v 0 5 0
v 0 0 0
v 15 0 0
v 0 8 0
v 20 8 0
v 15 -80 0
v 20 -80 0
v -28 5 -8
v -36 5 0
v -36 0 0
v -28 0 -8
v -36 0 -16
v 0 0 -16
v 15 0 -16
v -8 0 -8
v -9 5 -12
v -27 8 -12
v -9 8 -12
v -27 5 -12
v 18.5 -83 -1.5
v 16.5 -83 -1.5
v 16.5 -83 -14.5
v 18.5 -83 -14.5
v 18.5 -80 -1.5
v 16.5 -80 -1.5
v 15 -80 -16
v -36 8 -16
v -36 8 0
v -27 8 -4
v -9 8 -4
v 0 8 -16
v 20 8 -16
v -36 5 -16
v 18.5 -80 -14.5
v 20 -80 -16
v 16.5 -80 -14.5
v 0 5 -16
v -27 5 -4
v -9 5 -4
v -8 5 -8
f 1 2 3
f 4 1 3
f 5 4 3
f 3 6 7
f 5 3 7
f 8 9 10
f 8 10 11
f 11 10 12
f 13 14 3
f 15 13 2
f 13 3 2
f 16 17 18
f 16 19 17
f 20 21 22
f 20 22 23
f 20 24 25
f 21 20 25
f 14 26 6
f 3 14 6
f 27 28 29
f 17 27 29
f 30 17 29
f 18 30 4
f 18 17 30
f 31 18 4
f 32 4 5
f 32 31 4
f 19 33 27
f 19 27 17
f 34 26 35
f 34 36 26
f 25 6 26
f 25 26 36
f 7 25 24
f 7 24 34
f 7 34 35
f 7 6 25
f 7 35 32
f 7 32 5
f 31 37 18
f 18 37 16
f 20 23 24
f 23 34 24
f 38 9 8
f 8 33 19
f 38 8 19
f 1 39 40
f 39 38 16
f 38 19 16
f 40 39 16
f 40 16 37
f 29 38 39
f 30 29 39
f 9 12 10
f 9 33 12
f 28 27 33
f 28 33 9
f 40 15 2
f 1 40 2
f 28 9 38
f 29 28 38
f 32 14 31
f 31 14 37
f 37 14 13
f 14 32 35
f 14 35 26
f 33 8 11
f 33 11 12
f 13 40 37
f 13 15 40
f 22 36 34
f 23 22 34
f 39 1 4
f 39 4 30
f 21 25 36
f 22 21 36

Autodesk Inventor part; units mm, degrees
ref_plane "YZ Plane" through (0, 0, 0) normal (1, 0, 0) x (0, 1, 0)
ref_plane "XZ Plane" through (0, 0, 0) normal (0, 1, 0) x (-1, 0, 0)
ref_plane "XY Plane" through (0, 0, 0) normal (0, 0, 1) x (1, 0, 0)
sketch "Sketch1" plane through (0, 0, 0) normal (0, 1, 0) x (-1, 0, 0)
  line L0 (0, 0) -> (0, -16)
  line L1 (8, -8) -> (0, 0)
  line L2 (8, -8) -> (0, -16)
  line L3 (0, 0) -> (-20, 0)
  line L4 (-20, 0) -> (-20, -16)
  line L5 (-20, -16) -> (0, -16)
  dimension "d0" = 16
  dimension "d2" = 20
extrude "Extrusion1" add sketch "Sketch1" along normal blind 5
sketch "Sketch2" plane through (0, 0, 0) normal (0, -1, 0) x (1, 0, 0)
  line L0 (20, -16) -> (0, -16) projected
  line L1 (20, -16) -> (15, -16)
  line L2 (15, -16) -> (15, 0)
  line L3 (0, 0) -> (20, 0) projected
  line L4 (20, 0) -> (20, -16) projected
  line L5 (20, 0) -> (20, -16)
  line L6 (20, -16) -> (18.5, -16)
  line L7 (15, -16) -> (15, -14.5)
  line L8 (15, -16) -> (16.5, -16)
  line L9 (16.5, -14.5) -> (18.5, -14.5)
  line L10 (18.5, -14.5) -> (18.5, -1.5)
  line L11 (18.5, -1.5) -> (16.5, -1.5)
  line L12 (16.5, -1.5) -> (16.5, -14.5)
  dimension "d5" = 5
  dimension "d8" = 1.5
  dimension "d9" = 1.5
  dimension "d11" = 13
extrude "Extrusion2" add sketch "Sketch2" along normal blind 80
extrude "Extrusion3" add sketch "Sketch2" along normal blind 83 contours L12 L11 L10 L9
sketch "Sketch3" plane through (0, 5, 0) normal (0, 1, 0) x (1, 0, 0)
  line L0 (0, 0) -> (20, 0) projected
  line L1 (20, 16) -> (0, 16) projected
  line L2 (0, 0) -> (0, 16)
  line L3 (0, 16) -> (-8, 8) projected
  line L4 (0, 16) -> (-8, 8)
  line L5 (-8, 8) -> (0, 0)
  line L6 (0, 0) -> (-36, 0)
  line L7 (-36, 0) -> (-28, 8)
  line L8 (-28, 8) -> (-36, 16)
  line L9 (-36, 16) -> (0, 16)
  line L10 (-36, 16) -> (-36, 0)
  dimension "d14" = 36
  dimension "d15" = 45
extrude "Extrusion4" add sketch "Sketch3" against normal blind 5 contours L10 L8 L7
sketch "Sketch4" plane through (0, 5, 0) normal (0, 1, 0) x (1, 0, 0)
  line L0 (-28, 8) -> (-36, 0) projected
  line L1 (20, 16) -> (20, 0) projected
  line L2 (-36, 0) -> (20, 0)
  line L3 (20, 0) -> (20, 16)
  line L4 (20, 16) -> (-36, 16)
  line L5 (-36, 16) -> (-36, 0)
  line L6 (-36, 8) -> (20, 8)
  line L7 (-28, 8) -> (-8, 8)
  line L8 (-36, 16) -> (-18, 8)
  line L9 (-36, 0) -> (-18, 8)
  line L10 (0, 0) -> (-18, 8)
  line L11 (0, 16) -> (-8, 8) projected
  line L12 (0, 16) -> (-18, 8)
  line L13 (-27, 12) -> (-9, 12)
  line L14 (-27, 4) -> (-9, 4)
extrude "Extrusion5" add sketch "Sketch4" along normal blind 3 contours L6 L9 L0 | L0 L5 L6 | L6 L5 L8 | L12 L11 L6 | L10 L14 L9 | L6 L1 L2 L10 | L8 L13 L12 | L11 L4 L1 L6
sketch "Sketch5" plane through (0, -80, 0) normal (0, -1, 0) x (1, 0, 0)
  line L0 (15, -16) -> (20, -16) projected
  line L1 (15, -16) -> (15, 0) projected
  line L2 (20, -16) -> (15, -16)
  line L3 (15, -16) -> (15, 0)
  line L4 (15, 0) -> (20, 0)
  line L5 (20, 0) -> (20, -16)
  line L6 (18.5, -14.5) -> (16.5, -14.5) projected
  line L7 (20, -16) -> (18.5, -16)
  line L8 (18.5, -16) -> (18.5, -14.5)
  line L9 (18.5, -14.5) -> (20, -14.5)
  line L10 (20, -14.5) -> (20, -16)
  line L11 (18.5, -1.5) -> (18.5, -14.5) projected
  line L12 (18.5, -14.5) -> (16.5, -14.5)
  line L13 (16.5, -14.5) -> (16.5, -1.5)
  line L14 (16.5, -1.5) -> (18.5, -1.5)
  line L15 (18.5, -1.5) -> (18.5, -14.5)
  point P0 (0, 0)
properties part number "Connecting pt.1"
